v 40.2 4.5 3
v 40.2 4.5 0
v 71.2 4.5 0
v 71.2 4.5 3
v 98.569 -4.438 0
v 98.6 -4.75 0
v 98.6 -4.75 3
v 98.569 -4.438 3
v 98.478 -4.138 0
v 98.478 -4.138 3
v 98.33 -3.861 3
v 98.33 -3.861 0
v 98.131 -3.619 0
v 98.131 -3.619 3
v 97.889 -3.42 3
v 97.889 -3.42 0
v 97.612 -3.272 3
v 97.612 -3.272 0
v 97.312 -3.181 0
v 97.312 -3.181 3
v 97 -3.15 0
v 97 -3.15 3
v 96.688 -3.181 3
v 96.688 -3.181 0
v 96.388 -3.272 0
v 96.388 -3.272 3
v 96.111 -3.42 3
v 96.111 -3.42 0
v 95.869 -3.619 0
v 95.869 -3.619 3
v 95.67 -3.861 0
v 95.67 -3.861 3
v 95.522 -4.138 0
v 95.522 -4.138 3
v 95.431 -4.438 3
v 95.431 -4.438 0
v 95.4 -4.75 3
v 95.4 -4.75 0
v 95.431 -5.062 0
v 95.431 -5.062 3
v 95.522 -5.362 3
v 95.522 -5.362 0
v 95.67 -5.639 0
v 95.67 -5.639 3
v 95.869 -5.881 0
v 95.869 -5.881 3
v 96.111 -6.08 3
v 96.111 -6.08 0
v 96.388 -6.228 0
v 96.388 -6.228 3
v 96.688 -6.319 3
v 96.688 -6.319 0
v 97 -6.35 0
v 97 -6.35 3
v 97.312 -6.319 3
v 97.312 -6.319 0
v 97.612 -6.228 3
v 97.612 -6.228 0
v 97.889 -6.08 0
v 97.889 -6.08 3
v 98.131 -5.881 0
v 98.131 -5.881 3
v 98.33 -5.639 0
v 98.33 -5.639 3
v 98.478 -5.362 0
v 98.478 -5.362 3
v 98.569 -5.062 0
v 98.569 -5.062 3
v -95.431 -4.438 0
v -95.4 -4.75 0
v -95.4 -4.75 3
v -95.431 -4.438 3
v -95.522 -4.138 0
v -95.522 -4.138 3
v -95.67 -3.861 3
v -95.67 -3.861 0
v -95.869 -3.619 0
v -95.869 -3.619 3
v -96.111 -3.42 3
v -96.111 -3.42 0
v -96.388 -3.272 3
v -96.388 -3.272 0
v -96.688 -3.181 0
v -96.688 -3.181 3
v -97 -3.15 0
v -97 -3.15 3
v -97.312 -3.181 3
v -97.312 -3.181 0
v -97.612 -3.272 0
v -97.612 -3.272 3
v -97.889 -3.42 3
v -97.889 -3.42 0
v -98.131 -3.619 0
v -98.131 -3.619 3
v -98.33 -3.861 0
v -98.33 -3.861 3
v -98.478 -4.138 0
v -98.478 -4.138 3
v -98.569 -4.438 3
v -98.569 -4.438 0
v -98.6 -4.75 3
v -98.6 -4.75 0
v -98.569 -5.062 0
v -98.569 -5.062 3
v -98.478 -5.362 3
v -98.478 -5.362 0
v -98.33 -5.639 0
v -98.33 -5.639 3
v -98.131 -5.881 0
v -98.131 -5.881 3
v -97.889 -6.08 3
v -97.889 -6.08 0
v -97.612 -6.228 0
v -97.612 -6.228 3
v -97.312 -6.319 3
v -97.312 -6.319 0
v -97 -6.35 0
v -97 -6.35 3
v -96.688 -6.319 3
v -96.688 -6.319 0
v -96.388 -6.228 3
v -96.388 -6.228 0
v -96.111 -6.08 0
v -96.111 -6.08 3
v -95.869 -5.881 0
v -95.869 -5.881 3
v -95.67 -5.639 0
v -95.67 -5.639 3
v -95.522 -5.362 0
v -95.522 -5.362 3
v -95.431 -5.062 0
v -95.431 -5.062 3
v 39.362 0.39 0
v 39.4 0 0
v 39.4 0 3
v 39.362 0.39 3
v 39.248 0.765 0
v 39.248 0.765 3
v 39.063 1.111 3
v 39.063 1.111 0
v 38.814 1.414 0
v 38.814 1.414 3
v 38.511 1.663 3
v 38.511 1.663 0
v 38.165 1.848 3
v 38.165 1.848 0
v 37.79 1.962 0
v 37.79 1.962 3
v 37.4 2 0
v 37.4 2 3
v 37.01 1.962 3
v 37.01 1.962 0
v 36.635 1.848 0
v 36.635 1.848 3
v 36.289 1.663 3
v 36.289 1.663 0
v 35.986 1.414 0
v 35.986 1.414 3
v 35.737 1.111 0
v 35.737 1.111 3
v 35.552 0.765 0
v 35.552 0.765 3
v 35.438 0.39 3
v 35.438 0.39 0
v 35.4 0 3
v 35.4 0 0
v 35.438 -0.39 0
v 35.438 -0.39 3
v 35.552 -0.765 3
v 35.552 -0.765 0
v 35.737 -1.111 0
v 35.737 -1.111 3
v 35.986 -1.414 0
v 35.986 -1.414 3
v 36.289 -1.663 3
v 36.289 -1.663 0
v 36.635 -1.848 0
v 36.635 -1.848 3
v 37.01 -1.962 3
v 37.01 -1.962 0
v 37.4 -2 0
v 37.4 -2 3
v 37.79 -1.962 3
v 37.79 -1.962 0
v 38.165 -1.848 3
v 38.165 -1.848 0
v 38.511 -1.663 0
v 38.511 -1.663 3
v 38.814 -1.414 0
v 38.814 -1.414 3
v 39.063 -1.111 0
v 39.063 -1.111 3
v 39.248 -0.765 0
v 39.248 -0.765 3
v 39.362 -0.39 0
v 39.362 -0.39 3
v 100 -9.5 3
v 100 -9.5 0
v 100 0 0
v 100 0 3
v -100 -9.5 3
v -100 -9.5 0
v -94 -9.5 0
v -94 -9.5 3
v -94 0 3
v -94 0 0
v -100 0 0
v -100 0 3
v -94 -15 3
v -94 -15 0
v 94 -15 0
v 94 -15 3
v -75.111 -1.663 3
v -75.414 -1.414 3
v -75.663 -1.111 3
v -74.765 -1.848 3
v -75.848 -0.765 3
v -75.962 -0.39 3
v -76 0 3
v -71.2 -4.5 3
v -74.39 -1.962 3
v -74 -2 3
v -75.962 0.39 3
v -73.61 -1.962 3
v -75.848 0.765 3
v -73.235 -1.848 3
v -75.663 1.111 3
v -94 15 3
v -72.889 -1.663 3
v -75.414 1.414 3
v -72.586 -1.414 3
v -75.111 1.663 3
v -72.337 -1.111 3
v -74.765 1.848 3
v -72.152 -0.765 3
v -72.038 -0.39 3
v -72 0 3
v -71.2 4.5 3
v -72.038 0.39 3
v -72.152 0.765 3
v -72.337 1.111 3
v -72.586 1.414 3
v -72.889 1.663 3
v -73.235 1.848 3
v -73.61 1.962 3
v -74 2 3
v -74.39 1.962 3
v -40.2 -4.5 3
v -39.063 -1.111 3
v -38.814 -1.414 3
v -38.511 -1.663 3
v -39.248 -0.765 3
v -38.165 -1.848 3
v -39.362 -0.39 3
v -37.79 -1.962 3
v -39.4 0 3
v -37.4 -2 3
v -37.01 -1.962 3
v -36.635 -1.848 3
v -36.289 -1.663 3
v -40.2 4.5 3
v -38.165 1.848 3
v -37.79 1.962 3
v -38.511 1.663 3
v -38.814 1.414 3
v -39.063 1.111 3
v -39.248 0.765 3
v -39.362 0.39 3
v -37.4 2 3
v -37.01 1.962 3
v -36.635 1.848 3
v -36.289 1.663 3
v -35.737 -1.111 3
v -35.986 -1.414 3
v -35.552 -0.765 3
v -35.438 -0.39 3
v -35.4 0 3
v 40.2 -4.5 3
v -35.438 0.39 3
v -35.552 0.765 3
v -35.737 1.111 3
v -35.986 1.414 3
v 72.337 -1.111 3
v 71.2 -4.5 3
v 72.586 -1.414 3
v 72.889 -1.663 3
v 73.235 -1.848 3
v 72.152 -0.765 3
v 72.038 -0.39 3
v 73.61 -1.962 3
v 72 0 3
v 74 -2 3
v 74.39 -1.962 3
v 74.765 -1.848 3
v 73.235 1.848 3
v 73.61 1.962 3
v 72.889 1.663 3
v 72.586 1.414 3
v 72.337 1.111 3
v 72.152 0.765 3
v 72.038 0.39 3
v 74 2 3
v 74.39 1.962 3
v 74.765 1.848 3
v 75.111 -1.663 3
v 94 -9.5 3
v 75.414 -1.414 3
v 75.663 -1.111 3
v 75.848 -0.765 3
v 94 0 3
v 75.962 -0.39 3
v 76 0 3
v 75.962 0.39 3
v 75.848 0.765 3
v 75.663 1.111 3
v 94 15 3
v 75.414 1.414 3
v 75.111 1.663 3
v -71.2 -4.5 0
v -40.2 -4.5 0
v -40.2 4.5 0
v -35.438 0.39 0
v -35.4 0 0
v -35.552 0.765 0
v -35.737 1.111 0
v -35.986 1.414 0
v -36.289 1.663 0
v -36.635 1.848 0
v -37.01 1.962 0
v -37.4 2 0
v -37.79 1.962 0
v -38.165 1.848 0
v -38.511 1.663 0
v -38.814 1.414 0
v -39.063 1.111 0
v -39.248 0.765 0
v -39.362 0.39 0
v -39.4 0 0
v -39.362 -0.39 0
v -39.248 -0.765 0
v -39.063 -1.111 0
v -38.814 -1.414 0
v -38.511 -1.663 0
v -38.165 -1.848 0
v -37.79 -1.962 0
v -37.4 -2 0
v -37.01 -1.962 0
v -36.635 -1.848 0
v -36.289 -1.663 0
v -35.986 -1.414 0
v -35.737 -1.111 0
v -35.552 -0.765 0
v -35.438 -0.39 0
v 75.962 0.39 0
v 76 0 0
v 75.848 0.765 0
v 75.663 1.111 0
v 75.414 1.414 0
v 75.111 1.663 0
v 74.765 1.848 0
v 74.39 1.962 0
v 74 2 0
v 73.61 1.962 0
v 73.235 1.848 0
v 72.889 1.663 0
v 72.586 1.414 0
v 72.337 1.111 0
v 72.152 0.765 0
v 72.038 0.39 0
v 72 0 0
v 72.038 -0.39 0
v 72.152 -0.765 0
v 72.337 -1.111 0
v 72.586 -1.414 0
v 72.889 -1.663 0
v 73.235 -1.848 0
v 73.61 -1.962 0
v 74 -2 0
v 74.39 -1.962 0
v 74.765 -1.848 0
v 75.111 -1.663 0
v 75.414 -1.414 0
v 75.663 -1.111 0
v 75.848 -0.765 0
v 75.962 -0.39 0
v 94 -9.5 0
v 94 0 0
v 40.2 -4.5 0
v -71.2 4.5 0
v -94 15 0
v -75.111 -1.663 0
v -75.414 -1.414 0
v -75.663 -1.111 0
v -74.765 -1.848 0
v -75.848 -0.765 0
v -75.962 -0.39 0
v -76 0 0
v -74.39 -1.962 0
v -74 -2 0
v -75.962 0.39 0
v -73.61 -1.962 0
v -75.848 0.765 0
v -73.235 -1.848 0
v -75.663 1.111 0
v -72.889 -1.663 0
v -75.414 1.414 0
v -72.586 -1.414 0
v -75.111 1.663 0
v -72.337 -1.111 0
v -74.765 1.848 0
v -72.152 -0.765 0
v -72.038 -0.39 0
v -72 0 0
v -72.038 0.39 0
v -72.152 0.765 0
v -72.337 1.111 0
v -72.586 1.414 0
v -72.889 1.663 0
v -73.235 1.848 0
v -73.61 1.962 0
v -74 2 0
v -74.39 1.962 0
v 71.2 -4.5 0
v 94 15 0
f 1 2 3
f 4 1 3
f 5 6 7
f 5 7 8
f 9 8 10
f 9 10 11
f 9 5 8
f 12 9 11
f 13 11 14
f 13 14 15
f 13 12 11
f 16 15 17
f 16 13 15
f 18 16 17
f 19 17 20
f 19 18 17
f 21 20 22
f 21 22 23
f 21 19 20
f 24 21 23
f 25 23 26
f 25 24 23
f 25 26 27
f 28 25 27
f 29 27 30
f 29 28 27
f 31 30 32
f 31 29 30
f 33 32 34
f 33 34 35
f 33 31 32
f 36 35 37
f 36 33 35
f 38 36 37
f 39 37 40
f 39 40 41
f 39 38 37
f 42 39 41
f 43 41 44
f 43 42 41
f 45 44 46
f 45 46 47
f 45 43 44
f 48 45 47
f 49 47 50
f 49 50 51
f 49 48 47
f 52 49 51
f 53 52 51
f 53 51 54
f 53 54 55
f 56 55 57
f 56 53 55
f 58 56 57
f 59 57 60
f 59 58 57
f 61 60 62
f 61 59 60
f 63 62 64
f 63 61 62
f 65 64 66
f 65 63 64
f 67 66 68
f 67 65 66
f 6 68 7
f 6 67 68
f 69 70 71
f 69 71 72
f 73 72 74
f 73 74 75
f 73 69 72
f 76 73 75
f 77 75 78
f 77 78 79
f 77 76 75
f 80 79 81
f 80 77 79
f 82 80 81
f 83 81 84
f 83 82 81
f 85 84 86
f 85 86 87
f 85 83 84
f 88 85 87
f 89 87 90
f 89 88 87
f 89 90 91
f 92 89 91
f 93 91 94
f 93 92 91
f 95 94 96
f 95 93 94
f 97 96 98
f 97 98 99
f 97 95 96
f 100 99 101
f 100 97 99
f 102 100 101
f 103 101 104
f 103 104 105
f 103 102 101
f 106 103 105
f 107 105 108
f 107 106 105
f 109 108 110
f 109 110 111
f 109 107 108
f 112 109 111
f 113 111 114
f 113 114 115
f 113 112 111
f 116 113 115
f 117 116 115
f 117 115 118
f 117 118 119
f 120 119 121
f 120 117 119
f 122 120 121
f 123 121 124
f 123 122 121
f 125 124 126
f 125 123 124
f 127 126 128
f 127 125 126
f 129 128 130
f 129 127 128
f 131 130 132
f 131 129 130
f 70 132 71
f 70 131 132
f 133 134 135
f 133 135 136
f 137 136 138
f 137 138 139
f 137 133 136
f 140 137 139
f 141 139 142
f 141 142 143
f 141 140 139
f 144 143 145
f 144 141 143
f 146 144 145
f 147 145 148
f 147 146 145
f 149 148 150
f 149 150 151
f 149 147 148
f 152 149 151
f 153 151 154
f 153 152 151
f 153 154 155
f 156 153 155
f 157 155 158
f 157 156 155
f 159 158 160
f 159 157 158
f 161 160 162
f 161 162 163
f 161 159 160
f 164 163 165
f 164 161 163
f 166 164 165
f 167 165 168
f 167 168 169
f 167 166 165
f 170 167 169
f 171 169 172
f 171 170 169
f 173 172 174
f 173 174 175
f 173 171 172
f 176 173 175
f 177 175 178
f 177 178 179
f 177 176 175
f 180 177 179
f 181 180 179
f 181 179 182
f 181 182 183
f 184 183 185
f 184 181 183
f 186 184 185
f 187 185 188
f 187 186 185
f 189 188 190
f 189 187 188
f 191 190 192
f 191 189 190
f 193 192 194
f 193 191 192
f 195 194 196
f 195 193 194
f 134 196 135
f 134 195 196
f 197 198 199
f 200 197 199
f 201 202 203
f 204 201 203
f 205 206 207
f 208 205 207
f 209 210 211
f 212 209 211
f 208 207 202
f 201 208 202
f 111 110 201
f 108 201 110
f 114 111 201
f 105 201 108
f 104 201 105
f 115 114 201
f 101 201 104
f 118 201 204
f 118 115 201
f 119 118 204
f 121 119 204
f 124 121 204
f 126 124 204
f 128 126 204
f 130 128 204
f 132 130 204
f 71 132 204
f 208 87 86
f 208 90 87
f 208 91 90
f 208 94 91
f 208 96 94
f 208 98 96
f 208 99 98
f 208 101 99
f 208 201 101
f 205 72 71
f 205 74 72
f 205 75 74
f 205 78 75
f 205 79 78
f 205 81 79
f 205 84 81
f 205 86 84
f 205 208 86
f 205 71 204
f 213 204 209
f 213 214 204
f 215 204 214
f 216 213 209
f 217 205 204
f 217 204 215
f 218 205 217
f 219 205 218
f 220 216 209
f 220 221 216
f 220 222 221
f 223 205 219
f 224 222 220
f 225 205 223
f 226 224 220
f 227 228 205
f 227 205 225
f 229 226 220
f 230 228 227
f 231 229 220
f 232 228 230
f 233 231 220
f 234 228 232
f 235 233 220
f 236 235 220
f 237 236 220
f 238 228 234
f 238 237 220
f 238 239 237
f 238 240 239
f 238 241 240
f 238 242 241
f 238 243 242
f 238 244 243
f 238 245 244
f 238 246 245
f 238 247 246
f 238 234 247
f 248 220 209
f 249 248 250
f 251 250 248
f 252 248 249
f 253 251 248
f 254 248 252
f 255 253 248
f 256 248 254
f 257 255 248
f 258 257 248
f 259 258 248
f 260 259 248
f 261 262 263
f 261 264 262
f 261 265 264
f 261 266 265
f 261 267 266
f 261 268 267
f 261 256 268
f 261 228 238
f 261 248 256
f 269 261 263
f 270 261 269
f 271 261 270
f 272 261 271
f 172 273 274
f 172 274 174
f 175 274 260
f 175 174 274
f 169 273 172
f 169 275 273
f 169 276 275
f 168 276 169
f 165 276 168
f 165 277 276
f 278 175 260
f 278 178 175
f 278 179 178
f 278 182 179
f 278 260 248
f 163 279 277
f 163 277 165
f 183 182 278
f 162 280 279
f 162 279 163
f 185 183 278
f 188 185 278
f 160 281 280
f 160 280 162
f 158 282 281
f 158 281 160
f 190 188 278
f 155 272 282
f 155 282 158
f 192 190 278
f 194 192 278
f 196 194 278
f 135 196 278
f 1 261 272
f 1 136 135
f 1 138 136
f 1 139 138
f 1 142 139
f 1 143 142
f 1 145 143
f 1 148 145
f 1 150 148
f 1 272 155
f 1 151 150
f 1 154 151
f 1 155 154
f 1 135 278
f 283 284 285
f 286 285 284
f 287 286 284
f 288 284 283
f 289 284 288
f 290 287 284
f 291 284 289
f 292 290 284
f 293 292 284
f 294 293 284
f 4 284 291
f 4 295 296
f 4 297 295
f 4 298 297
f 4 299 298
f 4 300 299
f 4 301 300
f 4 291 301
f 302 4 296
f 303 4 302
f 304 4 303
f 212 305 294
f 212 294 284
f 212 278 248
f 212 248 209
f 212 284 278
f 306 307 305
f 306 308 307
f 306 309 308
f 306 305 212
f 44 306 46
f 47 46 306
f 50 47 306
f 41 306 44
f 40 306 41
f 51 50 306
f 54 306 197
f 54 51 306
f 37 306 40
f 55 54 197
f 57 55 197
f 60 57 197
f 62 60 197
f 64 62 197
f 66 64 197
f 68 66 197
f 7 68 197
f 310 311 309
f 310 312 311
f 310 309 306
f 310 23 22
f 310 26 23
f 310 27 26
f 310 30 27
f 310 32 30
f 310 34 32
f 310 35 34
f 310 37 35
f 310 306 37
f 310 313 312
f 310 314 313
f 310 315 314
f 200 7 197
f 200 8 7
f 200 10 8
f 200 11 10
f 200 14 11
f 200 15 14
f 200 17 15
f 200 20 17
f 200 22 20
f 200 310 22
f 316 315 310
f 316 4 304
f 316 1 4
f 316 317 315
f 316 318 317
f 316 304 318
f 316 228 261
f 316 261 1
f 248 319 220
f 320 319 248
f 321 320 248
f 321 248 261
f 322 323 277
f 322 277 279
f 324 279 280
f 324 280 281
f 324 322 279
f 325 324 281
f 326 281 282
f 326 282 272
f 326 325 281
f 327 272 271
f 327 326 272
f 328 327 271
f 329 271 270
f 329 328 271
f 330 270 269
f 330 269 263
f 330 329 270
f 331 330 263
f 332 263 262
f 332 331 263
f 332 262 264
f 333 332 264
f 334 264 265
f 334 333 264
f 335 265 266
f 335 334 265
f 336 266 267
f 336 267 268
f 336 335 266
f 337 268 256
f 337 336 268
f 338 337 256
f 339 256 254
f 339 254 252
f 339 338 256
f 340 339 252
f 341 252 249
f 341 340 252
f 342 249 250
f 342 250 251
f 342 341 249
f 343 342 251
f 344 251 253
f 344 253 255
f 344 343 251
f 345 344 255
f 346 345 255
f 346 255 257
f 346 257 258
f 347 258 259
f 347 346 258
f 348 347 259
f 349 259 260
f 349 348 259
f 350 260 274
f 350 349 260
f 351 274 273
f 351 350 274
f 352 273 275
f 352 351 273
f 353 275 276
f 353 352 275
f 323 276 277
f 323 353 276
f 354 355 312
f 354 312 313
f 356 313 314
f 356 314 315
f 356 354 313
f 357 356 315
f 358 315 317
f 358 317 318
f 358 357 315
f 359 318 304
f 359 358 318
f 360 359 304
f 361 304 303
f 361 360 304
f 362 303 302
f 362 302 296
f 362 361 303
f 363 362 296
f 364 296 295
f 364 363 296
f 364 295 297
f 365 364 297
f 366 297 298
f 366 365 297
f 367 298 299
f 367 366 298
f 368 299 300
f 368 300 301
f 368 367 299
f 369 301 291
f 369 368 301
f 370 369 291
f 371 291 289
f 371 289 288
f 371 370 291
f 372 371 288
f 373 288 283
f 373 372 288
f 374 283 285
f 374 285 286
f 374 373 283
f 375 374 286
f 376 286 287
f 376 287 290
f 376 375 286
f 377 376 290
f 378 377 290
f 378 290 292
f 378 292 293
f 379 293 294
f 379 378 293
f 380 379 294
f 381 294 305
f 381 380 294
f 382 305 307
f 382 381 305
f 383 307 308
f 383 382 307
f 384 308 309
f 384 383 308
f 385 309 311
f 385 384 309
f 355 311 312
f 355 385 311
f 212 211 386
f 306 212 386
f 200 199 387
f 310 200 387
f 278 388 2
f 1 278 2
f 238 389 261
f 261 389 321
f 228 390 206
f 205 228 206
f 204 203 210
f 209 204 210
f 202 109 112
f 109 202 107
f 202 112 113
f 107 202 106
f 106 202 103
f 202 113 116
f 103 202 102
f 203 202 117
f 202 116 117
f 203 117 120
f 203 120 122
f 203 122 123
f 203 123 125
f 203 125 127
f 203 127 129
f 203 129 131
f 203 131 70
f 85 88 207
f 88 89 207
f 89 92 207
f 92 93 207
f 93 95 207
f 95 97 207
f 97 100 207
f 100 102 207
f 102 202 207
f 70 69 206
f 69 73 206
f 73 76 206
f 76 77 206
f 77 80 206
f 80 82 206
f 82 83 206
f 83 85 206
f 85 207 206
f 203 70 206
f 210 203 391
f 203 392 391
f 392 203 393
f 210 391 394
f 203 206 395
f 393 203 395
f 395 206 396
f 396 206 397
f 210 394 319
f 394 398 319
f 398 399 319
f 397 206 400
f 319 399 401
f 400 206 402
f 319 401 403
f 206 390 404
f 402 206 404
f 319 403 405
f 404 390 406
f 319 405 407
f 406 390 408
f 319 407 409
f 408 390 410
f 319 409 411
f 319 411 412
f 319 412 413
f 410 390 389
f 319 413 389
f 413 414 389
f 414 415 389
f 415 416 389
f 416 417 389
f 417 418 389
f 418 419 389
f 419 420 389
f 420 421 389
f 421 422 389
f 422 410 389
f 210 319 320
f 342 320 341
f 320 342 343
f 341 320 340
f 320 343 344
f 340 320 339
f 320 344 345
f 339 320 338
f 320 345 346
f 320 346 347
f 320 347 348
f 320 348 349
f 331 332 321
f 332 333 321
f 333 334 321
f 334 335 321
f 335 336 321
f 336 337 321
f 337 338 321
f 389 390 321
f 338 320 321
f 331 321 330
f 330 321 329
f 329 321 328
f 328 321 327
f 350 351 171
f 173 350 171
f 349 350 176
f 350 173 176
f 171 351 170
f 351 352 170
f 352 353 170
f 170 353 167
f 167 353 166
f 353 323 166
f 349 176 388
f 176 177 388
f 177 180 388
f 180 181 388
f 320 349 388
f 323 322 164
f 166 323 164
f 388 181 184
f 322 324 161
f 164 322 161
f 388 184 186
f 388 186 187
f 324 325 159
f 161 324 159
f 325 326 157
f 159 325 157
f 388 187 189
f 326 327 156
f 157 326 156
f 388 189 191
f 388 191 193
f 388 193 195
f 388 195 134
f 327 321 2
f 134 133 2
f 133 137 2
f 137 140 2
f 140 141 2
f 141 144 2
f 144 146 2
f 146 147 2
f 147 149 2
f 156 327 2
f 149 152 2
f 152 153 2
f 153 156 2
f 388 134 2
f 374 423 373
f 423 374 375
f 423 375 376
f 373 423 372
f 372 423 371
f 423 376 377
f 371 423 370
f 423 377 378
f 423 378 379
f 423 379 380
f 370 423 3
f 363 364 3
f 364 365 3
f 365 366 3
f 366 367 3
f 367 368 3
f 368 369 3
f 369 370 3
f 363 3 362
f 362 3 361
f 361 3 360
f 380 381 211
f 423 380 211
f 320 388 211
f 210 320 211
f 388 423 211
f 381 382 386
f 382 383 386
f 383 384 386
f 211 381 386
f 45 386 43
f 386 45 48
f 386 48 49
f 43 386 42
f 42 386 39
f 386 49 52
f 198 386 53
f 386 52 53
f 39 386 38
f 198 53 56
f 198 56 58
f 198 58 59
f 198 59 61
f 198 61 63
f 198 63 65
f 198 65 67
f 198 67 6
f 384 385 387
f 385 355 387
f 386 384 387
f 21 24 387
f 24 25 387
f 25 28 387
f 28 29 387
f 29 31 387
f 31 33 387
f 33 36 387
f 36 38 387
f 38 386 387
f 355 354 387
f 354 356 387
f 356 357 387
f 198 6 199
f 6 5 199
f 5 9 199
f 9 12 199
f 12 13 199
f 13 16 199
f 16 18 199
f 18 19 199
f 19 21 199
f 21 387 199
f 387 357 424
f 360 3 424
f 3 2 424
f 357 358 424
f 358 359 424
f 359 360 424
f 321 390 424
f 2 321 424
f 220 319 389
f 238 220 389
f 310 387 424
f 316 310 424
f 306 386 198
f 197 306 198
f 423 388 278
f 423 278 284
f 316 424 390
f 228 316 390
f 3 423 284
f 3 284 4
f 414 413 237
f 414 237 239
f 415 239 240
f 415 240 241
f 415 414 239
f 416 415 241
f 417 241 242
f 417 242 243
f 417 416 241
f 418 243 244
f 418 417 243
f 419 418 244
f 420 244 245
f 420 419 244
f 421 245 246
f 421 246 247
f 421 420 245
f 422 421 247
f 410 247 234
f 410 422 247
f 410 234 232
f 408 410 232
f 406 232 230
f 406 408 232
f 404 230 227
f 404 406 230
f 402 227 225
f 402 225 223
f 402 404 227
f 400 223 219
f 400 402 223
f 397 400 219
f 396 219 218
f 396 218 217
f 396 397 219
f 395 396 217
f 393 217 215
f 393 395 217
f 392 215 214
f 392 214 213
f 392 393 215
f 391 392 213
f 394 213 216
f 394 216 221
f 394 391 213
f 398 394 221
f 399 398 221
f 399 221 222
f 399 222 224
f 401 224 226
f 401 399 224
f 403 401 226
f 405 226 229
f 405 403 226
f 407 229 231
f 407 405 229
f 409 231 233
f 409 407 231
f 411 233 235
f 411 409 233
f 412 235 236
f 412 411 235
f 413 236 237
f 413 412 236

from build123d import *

# Parameters (mm, degrees)
ESBO_O1_R                = 1.6
ESBO_O1_R_2              = 2
ESBO_O1_W                = 31
ESBO_O1_H                = 9
RESSALTO_EXTRUS_O1_DEPTH = 3


with BuildPart() as part:
    # Esboço1 → Ressalto-extrusão1 (new body)
    with BuildSketch(Plane.XY):
        Polygon((-94, -9.5), (-94, -15), (94, -15), (94, -9.5), (100, -9.5), (100, 0), (94, 0), (94, 15), (-94, 15), (-94, 0), (-100, 0), (-100, -9.5), align=None)
        with Locations((-97, -4.75)):
            Circle(ESBO_O1_R, mode=Mode.SUBTRACT)
        with Locations((97, -4.75)):
            Circle(ESBO_O1_R, mode=Mode.SUBTRACT)
        with Locations((-74, 0)):
            Circle(ESBO_O1_R_2, mode=Mode.SUBTRACT)
        with Locations((-37.4, 0)):
            Circle(ESBO_O1_R_2, mode=Mode.SUBTRACT)
        with Locations((37.4, 0)):
            Circle(ESBO_O1_R_2, mode=Mode.SUBTRACT)
        with Locations((74, 0)):
            Circle(ESBO_O1_R_2, mode=Mode.SUBTRACT)
        with Locations((-55.7, 0)):
            Rectangle(ESBO_O1_W, ESBO_O1_H, mode=Mode.SUBTRACT)
        with Locations((55.7, 0)):
            Rectangle(ESBO_O1_W, ESBO_O1_H, mode=Mode.SUBTRACT)
    extrude(amount=RESSALTO_EXTRUS_O1_DEPTH)


solid = part.part
